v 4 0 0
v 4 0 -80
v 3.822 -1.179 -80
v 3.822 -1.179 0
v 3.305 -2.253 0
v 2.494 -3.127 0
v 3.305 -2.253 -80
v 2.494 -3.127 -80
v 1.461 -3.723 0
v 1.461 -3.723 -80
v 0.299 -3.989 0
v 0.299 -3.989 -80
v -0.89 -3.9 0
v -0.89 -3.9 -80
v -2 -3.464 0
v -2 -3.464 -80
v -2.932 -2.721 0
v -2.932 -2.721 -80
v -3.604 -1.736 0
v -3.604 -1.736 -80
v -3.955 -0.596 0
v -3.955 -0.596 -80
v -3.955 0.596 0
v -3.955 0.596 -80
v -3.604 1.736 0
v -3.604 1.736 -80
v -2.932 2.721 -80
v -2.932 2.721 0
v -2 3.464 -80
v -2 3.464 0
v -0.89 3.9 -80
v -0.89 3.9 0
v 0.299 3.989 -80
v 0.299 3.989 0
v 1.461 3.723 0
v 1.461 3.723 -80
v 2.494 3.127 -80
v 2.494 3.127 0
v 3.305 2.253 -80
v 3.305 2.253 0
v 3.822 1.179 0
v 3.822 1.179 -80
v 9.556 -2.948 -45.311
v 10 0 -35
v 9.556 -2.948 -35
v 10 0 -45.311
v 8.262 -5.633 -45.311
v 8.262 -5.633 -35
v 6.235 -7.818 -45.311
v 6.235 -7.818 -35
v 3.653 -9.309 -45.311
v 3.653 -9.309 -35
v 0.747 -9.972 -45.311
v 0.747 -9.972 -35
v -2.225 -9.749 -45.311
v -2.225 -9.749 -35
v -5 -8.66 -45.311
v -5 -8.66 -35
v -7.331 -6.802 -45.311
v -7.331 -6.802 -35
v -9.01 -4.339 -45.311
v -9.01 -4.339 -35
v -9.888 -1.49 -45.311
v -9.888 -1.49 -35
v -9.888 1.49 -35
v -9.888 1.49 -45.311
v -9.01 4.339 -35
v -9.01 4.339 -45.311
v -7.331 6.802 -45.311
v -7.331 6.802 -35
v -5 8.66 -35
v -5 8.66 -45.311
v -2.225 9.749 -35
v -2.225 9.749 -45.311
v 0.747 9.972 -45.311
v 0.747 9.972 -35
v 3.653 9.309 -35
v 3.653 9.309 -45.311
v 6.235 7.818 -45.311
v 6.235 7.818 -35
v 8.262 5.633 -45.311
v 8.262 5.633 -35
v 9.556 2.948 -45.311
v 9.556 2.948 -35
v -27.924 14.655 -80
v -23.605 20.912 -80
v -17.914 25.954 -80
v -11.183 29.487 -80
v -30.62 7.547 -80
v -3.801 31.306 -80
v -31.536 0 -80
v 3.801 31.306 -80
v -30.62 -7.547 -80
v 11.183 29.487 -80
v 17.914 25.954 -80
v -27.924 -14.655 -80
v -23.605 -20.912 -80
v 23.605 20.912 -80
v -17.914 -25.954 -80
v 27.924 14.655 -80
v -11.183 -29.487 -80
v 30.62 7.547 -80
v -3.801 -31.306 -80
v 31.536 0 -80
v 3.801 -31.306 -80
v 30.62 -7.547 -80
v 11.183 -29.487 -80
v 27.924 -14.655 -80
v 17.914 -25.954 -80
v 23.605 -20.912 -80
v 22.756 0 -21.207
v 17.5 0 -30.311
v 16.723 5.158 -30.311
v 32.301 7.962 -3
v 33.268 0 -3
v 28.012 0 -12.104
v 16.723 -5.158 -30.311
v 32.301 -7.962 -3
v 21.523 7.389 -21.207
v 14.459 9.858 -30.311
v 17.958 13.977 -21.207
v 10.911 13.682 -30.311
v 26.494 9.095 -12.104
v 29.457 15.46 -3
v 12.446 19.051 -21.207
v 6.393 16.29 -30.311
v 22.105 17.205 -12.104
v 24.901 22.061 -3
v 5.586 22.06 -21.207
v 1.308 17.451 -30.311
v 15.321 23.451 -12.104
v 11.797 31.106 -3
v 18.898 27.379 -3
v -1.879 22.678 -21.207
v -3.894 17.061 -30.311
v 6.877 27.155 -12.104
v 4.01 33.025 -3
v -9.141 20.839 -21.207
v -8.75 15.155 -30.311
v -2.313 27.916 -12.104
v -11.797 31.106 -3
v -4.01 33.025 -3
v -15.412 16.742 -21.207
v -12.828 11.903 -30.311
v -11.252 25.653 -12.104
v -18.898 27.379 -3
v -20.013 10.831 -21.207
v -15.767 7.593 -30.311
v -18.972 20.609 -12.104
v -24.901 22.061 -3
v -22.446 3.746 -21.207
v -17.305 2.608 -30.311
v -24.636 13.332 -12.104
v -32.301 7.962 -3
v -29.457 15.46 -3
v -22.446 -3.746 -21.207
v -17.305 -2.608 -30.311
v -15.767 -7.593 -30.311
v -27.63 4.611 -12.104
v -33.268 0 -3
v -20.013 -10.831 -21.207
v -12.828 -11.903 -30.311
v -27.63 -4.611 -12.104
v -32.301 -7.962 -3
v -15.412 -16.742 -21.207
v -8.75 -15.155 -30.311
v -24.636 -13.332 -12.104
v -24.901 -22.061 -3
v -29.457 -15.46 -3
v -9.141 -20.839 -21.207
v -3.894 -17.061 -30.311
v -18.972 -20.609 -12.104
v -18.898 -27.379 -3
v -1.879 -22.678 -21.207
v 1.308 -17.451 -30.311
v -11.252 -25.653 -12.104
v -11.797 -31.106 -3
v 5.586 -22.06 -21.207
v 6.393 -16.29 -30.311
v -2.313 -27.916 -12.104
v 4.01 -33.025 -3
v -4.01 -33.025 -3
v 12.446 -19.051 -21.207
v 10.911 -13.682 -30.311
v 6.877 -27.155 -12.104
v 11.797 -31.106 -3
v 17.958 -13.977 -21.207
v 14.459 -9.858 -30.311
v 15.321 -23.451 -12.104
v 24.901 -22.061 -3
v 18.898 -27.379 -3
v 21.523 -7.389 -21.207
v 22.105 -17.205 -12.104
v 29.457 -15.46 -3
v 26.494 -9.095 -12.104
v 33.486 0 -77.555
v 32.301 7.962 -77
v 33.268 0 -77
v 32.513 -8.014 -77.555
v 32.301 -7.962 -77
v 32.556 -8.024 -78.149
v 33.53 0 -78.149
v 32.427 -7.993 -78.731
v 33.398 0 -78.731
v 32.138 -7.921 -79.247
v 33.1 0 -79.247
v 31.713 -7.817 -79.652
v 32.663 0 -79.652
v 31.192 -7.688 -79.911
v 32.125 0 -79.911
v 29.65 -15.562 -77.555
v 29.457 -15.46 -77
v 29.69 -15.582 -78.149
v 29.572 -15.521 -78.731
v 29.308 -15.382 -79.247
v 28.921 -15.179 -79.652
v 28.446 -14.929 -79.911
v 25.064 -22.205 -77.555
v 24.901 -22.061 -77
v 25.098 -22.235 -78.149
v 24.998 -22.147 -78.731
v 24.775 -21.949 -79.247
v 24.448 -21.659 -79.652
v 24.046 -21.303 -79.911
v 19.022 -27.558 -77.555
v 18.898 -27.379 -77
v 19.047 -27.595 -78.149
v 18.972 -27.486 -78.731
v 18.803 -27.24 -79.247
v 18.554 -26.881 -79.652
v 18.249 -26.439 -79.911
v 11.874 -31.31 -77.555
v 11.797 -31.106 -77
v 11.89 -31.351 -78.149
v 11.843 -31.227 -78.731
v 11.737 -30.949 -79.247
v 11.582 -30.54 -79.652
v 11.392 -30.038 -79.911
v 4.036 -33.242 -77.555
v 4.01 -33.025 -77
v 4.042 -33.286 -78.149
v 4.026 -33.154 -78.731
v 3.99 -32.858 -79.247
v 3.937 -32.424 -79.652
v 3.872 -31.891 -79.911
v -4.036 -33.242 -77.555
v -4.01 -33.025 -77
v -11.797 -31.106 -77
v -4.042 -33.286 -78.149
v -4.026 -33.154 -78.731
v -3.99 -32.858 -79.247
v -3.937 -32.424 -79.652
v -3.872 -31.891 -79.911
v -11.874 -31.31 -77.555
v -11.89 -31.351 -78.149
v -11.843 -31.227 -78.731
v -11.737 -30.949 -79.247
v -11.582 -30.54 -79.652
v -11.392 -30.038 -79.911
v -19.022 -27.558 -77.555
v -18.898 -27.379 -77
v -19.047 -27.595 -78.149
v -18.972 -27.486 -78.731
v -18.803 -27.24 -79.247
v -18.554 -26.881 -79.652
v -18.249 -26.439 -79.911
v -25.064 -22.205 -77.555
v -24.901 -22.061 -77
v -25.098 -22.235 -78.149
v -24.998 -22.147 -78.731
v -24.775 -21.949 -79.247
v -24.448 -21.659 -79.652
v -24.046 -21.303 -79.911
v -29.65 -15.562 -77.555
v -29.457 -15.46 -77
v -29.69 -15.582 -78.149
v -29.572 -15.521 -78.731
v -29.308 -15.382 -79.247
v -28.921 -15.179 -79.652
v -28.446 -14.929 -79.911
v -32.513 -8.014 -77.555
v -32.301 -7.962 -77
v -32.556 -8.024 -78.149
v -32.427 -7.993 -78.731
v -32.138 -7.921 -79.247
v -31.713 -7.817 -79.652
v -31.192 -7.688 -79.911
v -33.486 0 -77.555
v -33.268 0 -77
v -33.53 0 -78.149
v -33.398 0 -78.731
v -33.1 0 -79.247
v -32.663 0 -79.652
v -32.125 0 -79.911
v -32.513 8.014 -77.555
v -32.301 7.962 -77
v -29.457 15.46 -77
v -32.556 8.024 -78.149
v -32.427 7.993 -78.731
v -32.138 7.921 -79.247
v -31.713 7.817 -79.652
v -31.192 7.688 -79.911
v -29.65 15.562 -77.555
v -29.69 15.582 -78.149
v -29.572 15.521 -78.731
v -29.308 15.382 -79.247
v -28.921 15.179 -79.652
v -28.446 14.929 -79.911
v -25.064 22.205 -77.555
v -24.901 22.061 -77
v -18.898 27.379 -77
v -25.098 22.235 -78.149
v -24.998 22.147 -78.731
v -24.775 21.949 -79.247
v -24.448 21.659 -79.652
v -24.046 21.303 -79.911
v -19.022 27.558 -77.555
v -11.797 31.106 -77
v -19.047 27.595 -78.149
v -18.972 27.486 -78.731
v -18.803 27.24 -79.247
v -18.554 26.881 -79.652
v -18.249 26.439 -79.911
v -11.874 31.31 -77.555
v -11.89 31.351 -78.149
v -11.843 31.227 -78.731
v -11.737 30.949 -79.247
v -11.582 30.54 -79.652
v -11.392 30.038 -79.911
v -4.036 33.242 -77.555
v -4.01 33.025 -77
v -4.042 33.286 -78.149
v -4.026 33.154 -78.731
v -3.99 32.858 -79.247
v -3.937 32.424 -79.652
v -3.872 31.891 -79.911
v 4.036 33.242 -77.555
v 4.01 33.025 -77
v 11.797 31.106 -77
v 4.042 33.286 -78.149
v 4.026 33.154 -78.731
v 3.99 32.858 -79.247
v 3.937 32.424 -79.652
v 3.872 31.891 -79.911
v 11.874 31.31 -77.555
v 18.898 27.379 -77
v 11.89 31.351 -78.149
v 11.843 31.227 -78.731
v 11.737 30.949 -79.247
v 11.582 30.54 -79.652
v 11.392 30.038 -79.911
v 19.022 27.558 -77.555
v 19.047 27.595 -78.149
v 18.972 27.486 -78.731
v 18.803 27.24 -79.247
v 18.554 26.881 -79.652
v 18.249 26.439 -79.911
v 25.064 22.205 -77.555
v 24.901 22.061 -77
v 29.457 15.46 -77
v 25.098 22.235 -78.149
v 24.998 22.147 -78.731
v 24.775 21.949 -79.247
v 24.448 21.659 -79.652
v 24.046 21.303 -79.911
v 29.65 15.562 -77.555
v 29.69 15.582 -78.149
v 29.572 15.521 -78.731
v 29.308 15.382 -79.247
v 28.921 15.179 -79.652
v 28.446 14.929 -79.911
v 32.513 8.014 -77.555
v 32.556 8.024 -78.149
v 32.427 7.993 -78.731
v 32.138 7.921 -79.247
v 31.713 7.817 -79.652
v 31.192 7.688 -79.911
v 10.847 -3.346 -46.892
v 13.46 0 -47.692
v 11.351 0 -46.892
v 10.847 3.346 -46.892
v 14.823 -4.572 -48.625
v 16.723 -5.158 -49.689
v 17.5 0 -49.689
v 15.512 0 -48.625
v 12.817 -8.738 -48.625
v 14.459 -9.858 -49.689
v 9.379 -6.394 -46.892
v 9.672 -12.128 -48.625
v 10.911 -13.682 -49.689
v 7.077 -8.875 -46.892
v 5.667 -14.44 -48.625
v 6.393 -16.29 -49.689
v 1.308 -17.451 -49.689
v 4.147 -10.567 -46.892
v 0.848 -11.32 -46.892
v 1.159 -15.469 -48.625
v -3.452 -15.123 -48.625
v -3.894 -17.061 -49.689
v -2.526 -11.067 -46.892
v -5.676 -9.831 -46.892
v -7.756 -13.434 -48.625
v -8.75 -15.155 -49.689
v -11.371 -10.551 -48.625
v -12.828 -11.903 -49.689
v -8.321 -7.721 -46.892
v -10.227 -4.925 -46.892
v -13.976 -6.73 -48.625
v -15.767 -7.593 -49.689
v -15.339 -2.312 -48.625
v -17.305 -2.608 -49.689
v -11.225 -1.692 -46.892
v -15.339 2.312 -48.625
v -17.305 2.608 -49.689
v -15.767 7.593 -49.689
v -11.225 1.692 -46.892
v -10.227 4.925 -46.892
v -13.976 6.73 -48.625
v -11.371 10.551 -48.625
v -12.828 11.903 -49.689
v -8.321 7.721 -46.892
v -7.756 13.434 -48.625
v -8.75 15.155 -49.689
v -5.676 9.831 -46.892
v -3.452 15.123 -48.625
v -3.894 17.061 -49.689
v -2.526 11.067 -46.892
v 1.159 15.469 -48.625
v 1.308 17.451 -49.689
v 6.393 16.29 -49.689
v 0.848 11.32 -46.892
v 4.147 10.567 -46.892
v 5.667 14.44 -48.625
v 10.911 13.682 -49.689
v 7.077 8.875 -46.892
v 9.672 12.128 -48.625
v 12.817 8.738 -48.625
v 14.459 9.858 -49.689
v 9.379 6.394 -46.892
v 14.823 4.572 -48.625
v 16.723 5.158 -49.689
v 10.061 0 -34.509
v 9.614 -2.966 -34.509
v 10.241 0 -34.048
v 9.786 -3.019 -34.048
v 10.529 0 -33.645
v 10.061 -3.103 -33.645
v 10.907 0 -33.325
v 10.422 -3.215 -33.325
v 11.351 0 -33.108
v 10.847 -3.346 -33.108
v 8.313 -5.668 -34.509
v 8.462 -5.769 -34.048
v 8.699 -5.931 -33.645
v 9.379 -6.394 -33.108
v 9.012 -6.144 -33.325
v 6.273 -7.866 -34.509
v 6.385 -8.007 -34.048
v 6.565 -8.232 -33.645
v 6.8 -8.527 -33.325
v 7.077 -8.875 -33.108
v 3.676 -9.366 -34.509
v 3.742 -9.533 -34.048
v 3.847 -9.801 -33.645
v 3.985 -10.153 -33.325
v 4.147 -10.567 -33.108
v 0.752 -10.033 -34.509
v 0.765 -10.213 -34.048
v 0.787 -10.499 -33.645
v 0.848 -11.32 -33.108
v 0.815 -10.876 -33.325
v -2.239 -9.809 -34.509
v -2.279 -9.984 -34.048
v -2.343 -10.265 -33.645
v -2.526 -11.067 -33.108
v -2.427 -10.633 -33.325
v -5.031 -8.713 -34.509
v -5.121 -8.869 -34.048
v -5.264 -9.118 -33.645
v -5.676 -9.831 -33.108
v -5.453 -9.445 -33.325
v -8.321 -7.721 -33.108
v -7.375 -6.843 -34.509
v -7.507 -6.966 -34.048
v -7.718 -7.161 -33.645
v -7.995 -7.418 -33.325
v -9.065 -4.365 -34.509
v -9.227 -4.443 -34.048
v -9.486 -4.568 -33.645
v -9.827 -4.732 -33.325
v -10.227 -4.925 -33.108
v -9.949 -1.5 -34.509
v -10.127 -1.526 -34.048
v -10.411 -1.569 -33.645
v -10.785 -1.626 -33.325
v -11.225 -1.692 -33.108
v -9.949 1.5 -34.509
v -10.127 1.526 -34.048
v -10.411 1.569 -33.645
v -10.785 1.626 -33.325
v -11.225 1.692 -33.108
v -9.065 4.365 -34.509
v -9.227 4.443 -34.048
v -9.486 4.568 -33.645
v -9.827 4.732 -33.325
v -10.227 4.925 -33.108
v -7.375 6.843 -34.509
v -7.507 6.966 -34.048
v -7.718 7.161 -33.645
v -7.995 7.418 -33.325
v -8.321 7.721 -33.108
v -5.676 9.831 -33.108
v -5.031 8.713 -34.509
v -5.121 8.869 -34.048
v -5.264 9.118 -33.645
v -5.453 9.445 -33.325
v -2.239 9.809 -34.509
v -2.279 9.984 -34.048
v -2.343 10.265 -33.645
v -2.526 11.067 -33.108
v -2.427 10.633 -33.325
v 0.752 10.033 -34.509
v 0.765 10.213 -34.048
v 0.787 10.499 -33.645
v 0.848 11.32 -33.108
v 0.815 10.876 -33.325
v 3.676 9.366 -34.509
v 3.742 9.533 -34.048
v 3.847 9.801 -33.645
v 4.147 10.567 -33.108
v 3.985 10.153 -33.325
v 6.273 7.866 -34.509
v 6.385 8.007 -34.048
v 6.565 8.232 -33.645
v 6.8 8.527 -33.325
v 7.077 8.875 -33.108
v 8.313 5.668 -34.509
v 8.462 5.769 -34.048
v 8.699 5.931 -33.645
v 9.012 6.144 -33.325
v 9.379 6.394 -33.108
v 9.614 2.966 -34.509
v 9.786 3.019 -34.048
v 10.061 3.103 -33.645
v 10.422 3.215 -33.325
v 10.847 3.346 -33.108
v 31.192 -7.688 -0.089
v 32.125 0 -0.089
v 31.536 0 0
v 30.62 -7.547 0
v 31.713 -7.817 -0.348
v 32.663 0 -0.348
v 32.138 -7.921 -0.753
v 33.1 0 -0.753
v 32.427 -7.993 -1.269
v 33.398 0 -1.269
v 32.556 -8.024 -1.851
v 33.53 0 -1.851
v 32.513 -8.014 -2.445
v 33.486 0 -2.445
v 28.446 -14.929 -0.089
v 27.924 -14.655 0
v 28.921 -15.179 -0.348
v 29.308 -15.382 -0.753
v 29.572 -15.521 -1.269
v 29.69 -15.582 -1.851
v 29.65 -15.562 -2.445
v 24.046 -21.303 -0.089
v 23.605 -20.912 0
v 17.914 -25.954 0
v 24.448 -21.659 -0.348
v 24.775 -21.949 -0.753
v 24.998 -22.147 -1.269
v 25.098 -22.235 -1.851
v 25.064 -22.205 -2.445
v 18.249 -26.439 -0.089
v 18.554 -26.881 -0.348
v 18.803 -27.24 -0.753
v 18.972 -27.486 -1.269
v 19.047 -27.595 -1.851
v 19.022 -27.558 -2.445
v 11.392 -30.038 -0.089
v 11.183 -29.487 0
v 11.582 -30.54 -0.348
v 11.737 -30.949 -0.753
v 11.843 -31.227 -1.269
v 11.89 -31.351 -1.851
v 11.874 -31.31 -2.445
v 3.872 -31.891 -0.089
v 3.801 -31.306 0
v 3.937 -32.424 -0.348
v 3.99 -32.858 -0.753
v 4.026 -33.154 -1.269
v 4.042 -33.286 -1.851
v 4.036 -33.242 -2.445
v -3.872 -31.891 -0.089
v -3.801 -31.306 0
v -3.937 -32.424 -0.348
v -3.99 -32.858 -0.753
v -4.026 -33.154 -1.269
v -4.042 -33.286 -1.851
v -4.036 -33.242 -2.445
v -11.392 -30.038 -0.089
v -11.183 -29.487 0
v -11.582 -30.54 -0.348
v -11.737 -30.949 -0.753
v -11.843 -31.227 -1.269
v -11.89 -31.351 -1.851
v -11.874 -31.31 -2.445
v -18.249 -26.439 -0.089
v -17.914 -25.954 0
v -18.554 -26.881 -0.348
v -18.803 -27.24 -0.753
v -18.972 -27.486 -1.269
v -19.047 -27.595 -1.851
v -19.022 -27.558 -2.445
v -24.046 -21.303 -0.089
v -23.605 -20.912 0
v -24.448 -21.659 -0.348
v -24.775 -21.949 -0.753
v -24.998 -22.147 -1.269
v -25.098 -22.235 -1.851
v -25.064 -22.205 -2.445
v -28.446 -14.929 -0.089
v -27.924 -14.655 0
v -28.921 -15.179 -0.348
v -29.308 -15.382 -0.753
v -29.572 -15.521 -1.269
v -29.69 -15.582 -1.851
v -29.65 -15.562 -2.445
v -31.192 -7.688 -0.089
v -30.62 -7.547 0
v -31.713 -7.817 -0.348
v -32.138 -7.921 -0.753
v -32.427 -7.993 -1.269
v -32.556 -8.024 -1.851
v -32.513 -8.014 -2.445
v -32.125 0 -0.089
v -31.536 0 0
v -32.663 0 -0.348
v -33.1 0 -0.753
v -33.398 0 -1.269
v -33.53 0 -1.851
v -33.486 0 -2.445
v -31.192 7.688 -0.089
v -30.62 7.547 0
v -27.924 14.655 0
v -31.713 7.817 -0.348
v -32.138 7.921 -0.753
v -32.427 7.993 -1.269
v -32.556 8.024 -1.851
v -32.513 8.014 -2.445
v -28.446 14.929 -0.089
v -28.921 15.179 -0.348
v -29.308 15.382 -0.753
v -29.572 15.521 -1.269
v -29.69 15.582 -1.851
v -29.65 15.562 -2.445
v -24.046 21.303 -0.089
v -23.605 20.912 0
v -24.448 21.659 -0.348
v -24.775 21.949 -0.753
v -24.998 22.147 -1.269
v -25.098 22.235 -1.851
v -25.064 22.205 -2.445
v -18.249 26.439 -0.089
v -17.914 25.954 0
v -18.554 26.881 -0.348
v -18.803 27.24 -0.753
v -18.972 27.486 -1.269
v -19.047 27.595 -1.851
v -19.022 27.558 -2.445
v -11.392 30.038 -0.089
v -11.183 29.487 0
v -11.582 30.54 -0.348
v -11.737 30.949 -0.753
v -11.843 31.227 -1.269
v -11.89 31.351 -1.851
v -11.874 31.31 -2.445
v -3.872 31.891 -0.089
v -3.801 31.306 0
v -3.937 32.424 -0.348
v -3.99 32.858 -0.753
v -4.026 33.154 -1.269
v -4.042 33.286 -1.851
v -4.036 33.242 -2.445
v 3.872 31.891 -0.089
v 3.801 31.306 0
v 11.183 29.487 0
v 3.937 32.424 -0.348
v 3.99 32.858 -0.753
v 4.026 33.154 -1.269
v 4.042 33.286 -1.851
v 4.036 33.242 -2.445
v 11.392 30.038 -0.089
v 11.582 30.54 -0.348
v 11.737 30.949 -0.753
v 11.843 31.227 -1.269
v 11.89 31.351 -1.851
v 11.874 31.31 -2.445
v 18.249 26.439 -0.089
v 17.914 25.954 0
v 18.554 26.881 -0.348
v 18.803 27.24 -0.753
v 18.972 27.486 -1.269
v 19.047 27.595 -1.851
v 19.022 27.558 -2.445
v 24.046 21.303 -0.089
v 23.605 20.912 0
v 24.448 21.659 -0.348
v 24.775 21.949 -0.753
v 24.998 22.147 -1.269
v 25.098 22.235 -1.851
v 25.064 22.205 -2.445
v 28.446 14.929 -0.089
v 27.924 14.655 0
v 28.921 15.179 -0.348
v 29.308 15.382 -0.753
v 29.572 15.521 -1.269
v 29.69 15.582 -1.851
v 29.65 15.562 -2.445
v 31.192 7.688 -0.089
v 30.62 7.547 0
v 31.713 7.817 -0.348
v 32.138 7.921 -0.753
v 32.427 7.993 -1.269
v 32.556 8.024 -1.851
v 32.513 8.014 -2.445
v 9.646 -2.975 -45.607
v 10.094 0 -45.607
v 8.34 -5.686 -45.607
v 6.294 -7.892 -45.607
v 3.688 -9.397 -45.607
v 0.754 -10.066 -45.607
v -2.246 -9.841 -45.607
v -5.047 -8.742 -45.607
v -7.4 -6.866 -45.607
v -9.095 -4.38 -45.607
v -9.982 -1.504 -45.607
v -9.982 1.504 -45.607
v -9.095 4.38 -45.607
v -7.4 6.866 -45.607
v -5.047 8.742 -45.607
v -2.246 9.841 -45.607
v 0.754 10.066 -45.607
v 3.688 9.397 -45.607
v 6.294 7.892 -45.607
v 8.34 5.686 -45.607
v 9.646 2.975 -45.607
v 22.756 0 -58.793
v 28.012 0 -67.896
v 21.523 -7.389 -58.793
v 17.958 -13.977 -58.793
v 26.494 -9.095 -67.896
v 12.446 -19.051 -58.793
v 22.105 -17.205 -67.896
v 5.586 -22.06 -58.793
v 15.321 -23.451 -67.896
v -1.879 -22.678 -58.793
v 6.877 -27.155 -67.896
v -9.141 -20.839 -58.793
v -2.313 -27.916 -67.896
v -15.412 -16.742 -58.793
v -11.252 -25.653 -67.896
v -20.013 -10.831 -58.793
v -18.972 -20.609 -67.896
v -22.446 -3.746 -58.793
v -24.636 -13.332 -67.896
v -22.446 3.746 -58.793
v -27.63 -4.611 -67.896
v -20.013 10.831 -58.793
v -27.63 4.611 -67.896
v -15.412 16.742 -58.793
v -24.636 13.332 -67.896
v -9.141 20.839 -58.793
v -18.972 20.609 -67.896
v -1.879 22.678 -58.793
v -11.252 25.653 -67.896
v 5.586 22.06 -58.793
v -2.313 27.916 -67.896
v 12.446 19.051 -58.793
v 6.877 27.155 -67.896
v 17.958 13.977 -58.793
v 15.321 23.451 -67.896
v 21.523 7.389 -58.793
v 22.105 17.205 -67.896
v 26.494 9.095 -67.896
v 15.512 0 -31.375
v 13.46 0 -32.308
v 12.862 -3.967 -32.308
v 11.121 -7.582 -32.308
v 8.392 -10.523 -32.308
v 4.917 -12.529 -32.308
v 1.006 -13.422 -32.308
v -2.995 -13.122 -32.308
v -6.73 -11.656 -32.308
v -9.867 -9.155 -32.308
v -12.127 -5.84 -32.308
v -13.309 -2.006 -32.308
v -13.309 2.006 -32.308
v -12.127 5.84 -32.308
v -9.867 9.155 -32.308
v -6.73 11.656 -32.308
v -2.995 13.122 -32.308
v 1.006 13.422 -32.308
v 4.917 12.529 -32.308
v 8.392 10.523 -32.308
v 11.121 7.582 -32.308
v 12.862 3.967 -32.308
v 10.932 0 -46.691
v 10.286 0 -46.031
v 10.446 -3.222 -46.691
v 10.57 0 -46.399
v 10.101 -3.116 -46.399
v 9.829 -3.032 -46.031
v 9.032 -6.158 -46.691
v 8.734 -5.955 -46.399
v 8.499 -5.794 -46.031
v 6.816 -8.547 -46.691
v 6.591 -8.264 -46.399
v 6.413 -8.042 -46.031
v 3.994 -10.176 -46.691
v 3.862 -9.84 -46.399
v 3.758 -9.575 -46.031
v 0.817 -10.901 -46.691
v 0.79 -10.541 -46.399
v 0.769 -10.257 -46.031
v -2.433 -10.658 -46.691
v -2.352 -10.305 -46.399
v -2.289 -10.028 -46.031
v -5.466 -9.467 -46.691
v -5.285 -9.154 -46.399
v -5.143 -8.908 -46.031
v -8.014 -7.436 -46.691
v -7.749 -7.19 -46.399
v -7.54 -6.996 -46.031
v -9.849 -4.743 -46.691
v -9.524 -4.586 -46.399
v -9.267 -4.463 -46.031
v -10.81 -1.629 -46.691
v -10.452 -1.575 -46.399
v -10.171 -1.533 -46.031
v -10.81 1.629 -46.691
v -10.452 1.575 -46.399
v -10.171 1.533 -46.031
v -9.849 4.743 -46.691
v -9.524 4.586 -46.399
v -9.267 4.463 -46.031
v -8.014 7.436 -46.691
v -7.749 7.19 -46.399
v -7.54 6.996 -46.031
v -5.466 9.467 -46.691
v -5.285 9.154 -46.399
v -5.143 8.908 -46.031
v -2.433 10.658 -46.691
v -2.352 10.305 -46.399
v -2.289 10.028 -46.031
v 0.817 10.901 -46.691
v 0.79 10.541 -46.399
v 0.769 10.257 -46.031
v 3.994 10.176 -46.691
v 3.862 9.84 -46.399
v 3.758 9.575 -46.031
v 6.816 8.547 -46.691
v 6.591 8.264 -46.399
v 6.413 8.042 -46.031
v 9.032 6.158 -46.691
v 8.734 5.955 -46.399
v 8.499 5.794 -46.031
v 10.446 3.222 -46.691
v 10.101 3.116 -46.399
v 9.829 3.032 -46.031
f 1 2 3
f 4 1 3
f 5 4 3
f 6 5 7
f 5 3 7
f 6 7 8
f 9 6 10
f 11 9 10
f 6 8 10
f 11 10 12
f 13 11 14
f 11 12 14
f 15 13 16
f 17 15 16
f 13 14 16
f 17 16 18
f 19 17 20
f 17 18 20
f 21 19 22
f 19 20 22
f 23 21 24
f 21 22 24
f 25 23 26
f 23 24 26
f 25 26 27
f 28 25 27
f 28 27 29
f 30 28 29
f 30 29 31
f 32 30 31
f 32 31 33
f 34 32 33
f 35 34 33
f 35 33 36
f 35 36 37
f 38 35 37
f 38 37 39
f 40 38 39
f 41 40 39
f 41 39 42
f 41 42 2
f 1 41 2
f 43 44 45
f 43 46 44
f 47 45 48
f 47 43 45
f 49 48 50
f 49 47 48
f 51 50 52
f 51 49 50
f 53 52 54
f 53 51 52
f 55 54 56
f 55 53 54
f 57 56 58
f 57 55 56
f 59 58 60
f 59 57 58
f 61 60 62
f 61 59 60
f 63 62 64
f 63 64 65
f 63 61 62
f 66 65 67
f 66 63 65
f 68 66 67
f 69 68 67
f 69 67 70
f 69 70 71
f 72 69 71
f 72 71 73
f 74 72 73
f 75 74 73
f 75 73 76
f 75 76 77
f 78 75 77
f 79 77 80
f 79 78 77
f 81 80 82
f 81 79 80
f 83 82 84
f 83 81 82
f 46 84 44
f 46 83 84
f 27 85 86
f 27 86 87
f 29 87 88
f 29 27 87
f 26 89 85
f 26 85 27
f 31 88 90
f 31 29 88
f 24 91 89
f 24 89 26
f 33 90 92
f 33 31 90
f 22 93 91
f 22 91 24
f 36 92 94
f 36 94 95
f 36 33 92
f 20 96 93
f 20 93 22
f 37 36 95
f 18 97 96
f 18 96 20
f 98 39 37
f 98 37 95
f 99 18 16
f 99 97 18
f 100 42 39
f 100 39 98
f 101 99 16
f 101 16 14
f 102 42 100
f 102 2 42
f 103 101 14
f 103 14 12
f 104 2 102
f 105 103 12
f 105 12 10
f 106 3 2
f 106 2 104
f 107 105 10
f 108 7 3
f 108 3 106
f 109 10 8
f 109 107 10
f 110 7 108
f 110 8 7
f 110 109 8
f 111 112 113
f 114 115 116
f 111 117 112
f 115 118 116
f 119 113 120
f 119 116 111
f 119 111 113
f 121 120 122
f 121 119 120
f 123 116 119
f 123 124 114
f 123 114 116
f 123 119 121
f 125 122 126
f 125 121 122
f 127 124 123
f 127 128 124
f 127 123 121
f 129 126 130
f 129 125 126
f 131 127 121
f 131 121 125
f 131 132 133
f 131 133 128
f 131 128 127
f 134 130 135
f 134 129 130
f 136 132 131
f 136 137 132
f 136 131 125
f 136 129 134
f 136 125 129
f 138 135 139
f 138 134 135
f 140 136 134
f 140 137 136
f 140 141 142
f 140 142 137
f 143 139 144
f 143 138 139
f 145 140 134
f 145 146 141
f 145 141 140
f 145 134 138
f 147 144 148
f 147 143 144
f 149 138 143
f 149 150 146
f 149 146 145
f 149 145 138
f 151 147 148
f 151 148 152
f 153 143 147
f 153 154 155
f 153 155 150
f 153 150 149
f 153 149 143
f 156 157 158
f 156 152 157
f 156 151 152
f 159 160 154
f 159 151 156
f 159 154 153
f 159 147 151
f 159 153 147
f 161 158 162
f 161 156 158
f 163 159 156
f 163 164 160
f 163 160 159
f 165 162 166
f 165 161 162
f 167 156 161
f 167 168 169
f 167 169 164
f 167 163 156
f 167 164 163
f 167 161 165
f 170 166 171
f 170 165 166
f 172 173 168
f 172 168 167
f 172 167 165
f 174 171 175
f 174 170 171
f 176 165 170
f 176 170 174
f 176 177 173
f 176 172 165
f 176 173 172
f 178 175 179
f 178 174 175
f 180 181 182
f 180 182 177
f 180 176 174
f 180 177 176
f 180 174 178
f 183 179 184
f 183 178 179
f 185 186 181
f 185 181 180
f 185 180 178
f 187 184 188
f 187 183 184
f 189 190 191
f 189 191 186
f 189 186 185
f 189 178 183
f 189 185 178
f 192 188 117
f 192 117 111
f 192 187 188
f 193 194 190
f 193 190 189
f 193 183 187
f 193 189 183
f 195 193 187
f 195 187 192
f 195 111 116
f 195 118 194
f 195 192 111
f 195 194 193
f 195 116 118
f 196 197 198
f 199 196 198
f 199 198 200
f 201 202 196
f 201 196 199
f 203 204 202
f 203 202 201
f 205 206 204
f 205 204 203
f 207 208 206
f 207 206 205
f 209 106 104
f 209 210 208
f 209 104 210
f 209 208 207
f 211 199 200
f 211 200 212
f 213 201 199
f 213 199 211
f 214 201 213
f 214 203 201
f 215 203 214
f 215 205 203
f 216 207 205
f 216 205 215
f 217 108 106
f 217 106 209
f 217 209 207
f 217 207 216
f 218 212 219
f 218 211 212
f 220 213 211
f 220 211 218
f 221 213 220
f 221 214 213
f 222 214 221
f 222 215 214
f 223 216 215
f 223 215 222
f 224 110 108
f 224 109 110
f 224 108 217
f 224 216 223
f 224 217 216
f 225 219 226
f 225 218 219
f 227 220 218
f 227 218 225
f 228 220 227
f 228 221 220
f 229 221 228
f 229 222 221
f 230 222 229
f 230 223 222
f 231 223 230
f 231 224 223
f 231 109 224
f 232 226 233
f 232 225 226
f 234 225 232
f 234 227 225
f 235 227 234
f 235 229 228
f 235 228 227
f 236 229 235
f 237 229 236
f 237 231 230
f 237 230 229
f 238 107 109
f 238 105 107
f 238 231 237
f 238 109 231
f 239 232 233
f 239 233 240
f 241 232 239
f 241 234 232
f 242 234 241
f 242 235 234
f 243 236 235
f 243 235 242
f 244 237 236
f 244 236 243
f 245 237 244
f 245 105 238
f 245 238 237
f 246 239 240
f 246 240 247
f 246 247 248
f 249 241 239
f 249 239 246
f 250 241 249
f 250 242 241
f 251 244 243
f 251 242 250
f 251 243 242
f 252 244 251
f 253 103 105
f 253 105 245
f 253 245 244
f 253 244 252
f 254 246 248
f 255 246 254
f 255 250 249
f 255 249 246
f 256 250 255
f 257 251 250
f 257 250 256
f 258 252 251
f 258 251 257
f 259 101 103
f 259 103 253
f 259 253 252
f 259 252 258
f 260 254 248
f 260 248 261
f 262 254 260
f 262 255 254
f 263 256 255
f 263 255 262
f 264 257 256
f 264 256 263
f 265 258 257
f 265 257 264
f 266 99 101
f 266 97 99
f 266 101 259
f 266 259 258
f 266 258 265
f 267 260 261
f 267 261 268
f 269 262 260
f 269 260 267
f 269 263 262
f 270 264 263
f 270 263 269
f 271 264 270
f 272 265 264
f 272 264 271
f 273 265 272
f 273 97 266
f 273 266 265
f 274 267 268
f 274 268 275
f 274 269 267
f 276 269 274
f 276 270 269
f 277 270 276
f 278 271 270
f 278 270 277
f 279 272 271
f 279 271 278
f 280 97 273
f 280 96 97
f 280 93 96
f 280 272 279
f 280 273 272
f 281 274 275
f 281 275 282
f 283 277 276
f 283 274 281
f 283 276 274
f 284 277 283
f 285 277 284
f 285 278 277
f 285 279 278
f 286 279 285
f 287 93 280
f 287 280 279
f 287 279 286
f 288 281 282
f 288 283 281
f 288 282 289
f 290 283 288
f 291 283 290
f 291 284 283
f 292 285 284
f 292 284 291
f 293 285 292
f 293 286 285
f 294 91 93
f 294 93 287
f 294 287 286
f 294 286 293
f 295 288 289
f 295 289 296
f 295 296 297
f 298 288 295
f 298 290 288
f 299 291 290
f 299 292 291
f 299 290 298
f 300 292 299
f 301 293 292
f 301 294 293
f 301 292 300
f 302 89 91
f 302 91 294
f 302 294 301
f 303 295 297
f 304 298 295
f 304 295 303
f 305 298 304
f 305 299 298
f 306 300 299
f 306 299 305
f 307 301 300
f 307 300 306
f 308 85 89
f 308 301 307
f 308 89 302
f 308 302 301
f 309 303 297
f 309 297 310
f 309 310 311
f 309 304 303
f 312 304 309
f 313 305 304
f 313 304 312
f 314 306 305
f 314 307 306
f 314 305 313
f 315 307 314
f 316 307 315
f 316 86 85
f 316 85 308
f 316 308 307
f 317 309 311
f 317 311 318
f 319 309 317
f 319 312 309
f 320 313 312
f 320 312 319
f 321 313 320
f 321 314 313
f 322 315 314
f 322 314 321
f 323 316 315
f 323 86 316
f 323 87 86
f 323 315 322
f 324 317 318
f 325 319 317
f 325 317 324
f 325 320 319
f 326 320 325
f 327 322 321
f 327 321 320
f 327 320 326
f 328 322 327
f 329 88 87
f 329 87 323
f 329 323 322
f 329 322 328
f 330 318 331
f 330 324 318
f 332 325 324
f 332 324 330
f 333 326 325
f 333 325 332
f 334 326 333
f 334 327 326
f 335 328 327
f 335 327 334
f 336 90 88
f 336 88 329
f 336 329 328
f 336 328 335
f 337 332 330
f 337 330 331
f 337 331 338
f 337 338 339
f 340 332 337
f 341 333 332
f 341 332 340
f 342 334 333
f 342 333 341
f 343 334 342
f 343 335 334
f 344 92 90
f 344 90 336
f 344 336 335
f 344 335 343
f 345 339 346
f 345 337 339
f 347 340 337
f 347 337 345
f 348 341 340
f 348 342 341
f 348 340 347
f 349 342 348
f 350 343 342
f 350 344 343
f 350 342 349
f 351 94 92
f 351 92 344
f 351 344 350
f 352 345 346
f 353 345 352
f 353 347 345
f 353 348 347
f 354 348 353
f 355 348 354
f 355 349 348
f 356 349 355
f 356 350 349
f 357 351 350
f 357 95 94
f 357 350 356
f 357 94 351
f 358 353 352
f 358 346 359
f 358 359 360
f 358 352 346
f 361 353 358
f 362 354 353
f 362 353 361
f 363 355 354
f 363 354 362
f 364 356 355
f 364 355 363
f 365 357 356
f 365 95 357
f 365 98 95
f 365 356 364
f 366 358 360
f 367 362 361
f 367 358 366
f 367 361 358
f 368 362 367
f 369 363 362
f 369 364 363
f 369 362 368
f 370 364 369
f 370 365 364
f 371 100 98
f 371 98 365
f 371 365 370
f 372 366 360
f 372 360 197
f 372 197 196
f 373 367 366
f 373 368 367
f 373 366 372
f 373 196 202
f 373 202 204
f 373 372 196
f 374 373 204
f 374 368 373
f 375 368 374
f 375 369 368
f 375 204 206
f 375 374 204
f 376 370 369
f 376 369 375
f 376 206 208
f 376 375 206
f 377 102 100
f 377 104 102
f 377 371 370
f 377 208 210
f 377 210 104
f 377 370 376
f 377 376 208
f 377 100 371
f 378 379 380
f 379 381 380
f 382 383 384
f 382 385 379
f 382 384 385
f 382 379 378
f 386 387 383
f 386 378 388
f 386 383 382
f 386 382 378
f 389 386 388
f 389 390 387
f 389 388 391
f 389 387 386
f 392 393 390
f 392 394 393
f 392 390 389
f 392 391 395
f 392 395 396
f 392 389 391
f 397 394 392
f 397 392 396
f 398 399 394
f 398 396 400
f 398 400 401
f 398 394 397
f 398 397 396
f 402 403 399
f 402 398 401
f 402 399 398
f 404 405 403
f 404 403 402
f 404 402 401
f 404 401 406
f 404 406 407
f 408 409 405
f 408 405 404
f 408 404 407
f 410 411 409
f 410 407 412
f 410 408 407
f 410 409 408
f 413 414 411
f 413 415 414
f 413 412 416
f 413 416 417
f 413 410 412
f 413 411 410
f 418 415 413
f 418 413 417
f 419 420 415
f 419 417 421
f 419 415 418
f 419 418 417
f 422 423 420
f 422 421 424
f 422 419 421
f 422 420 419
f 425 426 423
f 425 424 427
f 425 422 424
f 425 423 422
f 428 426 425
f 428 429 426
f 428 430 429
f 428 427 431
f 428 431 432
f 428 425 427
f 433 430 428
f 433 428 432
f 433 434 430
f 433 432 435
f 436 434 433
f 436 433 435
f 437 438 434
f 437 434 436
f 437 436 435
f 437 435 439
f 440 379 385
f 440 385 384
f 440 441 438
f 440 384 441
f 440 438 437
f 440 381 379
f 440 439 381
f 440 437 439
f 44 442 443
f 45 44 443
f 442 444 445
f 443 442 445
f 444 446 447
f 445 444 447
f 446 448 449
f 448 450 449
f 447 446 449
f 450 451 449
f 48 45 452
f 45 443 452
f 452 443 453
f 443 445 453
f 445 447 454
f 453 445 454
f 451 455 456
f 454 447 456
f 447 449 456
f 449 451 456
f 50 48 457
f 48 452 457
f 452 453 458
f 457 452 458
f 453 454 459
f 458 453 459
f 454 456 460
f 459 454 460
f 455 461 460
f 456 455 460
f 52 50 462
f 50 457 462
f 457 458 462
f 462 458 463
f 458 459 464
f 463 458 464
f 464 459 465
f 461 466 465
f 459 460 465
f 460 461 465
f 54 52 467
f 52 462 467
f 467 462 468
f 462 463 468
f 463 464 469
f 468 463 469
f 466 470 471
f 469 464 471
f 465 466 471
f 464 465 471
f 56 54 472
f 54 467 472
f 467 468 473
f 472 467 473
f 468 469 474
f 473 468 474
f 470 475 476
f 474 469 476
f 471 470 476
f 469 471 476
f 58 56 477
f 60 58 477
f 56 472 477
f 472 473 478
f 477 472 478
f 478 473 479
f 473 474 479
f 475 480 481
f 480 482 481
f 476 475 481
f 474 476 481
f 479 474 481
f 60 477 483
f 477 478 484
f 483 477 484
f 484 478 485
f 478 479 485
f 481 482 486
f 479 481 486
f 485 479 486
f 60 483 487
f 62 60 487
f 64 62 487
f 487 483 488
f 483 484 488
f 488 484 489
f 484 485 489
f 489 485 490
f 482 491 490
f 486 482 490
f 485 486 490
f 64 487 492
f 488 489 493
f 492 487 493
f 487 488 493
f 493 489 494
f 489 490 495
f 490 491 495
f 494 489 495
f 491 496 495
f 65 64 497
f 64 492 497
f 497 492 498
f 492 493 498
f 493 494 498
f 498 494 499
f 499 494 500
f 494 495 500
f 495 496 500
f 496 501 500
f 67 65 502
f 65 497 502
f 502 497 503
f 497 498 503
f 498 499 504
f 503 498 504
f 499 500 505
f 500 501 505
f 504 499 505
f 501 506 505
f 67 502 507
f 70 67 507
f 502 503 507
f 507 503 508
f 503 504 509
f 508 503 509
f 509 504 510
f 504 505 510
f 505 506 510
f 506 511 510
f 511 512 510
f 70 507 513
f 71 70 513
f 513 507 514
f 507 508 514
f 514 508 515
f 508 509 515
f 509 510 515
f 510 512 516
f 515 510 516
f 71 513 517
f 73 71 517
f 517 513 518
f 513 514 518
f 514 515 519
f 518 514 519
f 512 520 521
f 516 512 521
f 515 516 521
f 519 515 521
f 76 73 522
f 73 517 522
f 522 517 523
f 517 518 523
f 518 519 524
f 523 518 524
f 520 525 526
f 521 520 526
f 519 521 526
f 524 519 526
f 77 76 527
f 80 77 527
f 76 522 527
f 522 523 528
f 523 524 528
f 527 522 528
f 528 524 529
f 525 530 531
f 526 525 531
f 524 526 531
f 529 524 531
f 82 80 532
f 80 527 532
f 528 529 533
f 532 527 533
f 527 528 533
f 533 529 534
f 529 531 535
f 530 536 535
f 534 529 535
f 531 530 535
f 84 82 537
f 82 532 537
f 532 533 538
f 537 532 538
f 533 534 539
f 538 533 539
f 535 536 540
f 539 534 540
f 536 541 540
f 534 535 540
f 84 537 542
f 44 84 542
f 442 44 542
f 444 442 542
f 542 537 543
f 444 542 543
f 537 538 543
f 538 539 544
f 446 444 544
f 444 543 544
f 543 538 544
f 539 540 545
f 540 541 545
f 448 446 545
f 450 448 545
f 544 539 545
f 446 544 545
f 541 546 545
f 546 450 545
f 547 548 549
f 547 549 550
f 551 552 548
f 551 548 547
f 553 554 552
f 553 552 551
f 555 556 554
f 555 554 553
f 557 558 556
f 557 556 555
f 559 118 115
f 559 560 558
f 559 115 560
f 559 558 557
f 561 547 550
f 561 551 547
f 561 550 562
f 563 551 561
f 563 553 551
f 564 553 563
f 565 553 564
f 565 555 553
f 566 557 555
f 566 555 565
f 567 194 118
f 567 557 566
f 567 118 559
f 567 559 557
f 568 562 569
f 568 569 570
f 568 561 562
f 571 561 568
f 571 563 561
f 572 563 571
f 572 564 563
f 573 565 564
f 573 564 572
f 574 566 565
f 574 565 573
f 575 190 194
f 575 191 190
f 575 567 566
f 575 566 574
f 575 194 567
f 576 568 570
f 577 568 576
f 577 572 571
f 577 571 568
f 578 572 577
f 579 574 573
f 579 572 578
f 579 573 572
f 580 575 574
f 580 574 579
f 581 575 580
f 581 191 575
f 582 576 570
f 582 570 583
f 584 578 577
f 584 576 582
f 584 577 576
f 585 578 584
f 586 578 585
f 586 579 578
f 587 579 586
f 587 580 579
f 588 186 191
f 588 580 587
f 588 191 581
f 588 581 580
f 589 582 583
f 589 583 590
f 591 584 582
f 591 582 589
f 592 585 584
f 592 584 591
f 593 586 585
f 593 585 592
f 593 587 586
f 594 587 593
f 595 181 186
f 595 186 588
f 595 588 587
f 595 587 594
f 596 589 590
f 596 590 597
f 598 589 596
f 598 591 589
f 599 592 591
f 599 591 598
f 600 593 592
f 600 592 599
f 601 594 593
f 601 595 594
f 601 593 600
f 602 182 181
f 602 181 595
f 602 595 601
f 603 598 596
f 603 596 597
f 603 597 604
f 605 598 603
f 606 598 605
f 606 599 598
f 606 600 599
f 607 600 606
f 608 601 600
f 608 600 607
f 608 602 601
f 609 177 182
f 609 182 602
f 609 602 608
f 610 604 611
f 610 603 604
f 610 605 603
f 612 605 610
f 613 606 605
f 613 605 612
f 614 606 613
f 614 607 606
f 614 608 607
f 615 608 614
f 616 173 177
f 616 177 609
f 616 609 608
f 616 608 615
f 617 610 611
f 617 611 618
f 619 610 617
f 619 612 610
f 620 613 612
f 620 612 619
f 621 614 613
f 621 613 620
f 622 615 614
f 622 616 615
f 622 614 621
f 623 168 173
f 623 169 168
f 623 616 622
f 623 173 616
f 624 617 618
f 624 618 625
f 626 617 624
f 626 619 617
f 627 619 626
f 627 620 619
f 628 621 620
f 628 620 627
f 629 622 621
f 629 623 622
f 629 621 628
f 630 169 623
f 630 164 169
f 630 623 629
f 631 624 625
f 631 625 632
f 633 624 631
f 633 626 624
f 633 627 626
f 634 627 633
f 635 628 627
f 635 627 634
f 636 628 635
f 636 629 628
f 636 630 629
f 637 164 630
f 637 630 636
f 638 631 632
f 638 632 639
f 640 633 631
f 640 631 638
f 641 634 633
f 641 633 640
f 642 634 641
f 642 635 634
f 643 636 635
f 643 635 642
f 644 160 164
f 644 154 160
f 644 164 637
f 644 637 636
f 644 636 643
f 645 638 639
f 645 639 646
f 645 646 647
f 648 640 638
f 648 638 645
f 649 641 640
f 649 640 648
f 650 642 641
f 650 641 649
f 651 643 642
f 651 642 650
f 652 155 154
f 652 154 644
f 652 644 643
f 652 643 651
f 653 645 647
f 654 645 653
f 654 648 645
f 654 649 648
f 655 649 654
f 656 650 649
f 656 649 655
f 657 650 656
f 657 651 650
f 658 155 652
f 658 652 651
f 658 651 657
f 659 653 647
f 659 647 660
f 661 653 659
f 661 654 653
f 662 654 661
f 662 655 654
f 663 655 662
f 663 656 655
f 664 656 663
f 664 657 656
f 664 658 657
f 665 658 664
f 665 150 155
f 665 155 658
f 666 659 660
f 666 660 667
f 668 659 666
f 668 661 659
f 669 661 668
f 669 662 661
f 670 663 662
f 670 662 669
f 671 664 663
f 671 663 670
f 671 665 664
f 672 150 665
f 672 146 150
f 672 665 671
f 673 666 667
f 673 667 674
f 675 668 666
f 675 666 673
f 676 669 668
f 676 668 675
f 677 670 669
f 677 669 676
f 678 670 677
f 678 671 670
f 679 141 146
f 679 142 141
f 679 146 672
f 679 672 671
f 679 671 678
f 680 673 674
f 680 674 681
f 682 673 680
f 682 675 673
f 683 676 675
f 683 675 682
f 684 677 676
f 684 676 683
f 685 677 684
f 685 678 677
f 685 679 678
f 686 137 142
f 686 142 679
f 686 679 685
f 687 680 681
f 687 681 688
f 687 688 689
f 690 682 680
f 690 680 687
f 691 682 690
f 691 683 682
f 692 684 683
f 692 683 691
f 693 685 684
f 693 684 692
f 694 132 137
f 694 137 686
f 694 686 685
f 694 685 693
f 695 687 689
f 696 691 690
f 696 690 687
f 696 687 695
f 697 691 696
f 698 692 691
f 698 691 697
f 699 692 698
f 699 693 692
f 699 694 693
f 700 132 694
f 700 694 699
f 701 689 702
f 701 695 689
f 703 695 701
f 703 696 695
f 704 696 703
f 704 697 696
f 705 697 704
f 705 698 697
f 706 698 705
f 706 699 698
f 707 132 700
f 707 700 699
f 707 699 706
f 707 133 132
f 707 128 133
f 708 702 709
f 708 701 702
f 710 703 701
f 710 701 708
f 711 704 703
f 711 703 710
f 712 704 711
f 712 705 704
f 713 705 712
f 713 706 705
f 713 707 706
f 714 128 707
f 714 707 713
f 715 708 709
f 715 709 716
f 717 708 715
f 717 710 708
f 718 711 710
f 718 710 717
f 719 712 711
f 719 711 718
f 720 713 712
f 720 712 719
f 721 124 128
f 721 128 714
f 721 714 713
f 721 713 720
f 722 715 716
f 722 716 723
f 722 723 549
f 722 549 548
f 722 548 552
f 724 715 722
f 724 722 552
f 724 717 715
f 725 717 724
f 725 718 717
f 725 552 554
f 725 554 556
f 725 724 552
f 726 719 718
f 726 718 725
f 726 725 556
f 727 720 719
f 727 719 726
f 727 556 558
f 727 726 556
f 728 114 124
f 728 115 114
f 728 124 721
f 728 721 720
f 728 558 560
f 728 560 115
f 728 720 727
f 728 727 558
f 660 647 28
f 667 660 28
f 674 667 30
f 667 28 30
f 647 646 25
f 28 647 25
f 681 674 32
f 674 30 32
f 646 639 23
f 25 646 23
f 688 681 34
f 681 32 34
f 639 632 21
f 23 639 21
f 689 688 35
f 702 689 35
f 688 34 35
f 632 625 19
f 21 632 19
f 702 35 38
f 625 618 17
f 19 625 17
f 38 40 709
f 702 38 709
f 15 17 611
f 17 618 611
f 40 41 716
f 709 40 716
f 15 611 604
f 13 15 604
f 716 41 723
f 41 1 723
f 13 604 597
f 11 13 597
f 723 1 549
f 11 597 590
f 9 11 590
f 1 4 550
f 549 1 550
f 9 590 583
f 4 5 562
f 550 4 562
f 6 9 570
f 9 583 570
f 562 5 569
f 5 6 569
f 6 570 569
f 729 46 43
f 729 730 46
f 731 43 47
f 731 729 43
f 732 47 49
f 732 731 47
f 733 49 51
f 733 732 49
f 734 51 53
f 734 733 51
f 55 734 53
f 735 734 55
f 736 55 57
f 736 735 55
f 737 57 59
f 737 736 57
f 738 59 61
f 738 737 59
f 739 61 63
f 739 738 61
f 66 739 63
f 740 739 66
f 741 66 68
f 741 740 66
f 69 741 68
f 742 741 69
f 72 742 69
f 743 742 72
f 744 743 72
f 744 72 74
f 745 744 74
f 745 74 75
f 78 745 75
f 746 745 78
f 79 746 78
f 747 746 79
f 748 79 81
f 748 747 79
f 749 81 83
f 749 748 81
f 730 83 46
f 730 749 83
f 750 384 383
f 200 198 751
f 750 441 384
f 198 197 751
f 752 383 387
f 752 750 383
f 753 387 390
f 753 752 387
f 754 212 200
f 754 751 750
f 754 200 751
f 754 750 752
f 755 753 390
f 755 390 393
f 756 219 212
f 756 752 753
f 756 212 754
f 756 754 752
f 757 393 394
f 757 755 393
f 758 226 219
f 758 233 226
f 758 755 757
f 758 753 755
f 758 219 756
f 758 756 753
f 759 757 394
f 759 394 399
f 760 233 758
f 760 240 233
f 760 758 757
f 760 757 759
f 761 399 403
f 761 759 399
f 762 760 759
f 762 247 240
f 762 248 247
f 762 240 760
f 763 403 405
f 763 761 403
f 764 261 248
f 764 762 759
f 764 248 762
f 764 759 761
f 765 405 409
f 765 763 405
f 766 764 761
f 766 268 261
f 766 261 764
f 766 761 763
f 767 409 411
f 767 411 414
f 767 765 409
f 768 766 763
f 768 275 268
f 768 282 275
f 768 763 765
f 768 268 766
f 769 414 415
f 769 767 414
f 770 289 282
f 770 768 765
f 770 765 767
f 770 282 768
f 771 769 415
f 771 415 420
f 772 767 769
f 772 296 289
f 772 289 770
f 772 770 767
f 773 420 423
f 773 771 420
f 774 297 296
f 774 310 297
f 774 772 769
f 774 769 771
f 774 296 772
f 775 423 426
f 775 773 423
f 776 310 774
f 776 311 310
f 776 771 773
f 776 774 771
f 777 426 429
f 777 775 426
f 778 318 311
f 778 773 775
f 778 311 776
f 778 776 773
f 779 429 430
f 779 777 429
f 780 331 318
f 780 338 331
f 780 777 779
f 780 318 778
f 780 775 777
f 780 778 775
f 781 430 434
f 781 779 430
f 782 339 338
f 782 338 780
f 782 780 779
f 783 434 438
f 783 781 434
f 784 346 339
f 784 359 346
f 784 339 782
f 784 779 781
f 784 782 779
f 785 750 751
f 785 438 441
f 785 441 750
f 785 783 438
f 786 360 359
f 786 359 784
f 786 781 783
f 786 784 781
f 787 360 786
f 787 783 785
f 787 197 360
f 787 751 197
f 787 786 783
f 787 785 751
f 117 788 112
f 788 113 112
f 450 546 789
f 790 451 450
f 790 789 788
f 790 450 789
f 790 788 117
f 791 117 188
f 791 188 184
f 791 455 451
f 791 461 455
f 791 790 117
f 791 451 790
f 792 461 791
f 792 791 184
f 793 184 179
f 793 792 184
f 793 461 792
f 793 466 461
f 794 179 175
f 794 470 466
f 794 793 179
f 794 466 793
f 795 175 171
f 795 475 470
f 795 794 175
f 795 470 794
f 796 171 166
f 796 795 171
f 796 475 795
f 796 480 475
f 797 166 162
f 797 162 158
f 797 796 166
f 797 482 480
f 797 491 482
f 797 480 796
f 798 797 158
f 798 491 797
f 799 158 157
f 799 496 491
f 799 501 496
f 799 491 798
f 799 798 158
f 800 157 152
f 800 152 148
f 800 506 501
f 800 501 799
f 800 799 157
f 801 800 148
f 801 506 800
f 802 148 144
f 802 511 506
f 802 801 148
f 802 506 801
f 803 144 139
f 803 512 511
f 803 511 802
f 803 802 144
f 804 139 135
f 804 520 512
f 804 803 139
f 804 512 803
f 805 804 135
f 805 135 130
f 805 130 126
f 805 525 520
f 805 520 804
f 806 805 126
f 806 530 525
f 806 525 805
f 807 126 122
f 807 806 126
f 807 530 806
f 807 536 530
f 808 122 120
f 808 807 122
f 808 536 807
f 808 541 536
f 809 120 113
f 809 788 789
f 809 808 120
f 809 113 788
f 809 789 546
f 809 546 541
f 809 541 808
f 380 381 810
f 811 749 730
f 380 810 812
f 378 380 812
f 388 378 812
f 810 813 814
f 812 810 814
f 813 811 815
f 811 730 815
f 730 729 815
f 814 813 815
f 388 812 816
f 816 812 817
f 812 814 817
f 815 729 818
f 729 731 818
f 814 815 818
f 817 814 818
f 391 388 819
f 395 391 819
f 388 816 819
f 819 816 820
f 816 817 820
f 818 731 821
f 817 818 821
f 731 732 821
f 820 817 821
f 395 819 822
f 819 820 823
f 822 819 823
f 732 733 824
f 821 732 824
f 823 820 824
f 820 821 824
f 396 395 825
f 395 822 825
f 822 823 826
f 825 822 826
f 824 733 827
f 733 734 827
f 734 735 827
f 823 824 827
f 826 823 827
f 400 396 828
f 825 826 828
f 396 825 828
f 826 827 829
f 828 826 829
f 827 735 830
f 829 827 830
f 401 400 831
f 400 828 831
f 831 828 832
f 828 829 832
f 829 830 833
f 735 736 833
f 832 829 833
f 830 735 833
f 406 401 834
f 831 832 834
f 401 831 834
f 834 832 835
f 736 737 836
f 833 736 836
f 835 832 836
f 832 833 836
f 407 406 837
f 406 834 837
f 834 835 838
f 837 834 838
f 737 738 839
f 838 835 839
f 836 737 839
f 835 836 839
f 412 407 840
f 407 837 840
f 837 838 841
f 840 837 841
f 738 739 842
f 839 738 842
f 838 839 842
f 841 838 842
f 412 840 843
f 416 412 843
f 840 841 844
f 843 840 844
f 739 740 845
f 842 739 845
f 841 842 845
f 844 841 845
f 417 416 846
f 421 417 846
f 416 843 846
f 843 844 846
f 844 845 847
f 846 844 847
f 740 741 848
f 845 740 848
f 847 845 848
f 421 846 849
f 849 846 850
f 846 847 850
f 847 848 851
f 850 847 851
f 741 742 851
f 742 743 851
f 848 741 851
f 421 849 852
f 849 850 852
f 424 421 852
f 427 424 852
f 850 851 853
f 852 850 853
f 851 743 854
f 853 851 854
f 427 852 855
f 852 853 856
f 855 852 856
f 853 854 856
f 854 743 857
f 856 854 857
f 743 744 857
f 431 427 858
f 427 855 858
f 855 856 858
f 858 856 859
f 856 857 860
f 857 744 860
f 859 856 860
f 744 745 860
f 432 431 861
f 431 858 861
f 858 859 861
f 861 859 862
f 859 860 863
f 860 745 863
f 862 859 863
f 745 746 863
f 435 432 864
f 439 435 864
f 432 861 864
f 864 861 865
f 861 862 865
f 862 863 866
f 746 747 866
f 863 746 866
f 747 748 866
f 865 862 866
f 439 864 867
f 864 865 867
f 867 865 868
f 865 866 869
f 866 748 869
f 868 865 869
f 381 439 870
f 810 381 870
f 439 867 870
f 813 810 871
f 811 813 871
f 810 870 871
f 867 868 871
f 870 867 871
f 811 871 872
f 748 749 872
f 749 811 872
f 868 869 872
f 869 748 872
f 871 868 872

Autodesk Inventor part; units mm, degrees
ref_plane "YZ Plane" through (0, 0, 0) normal (1, 0, 0) x (0, 1, 0)
ref_plane "XZ Plane" through (0, 0, 0) normal (0, 1, 0) x (-1, 0, 0)
ref_plane "XY Plane" through (0, 0, 0) normal (0, 0, 1) x (1, 0, 0)
sketch "Sketch1" plane through (0, 0, 0) normal (0, 1, 0) x (-1, 0, 0)
  line L0 (0, 0) -> (-31.5359, 0)
  line L1 (0, 0) -> (27.4991, 0) construction
  line L2 (-33.2679, -3) -> (-17.5, -30.3109)
  line L3 (-35, 0) -> (8.6719, 0) construction
  line L4 (0, 0) -> (0, -35)
  arc A0 (-17.5, -30.3109) -> (-11.3514, -33.1081) centre (0, 0) ccw
  line L5 (-10, -35) -> (-10, -45.3109)
  line L6 (0, -45.3109) -> (0, -30.3109)
  line L7 (0, -80) -> (-31.5359, -80)
  line L8 (-33.2679, -77) -> (-17.5, -49.6891)
  line L9 (-35, -80) -> (8.6719, -80) construction
  line L10 (0, -80) -> (0, -45)
  arc A1 (-11.3514, -46.8919) -> (-17.5, -49.6891) centre (0, -80) ccw
  line L11 (-10.0944, -45.6071) -> (-10, -45.3109)
  line L12 (0, -45.3109) -> (0, -49.6891)
  arc A2 (-31.5359, 0) -> (-33.2679, -3) centre (-31.5359, -2) ccw
  arc A3 (-33.2679, -77) -> (-31.5359, -80) centre (-31.5359, -78) ccw
  arc A4 (-10, -35) -> (-11.3514, -33.1081) centre (-12, -35) ccw
  arc A5 (-11.3514, -46.8919) -> (-10.0944, -45.6071) centre (-12, -45) ccw
  line L13 (-4, 0) -> (-4, -80)
  dimension "d0" = 35
  dimension "d3" = 60
  dimension "d5" = 10
  dimension "d7" = 2
  dimension "d8" = 80
revolve "Revolution1" add sketch "Sketch1" angle 360 about axis through (0, 0, 0) along (0, 0, -1) contours L13 L7 A3 L8 A1 A5 L11 L5 A4 A0 L2 A2 L0
ref_plane "Work Plane1" through (0, 0, -40) normal (0, 0, 1) x (1, 0, 0)
properties part number "wheel"
